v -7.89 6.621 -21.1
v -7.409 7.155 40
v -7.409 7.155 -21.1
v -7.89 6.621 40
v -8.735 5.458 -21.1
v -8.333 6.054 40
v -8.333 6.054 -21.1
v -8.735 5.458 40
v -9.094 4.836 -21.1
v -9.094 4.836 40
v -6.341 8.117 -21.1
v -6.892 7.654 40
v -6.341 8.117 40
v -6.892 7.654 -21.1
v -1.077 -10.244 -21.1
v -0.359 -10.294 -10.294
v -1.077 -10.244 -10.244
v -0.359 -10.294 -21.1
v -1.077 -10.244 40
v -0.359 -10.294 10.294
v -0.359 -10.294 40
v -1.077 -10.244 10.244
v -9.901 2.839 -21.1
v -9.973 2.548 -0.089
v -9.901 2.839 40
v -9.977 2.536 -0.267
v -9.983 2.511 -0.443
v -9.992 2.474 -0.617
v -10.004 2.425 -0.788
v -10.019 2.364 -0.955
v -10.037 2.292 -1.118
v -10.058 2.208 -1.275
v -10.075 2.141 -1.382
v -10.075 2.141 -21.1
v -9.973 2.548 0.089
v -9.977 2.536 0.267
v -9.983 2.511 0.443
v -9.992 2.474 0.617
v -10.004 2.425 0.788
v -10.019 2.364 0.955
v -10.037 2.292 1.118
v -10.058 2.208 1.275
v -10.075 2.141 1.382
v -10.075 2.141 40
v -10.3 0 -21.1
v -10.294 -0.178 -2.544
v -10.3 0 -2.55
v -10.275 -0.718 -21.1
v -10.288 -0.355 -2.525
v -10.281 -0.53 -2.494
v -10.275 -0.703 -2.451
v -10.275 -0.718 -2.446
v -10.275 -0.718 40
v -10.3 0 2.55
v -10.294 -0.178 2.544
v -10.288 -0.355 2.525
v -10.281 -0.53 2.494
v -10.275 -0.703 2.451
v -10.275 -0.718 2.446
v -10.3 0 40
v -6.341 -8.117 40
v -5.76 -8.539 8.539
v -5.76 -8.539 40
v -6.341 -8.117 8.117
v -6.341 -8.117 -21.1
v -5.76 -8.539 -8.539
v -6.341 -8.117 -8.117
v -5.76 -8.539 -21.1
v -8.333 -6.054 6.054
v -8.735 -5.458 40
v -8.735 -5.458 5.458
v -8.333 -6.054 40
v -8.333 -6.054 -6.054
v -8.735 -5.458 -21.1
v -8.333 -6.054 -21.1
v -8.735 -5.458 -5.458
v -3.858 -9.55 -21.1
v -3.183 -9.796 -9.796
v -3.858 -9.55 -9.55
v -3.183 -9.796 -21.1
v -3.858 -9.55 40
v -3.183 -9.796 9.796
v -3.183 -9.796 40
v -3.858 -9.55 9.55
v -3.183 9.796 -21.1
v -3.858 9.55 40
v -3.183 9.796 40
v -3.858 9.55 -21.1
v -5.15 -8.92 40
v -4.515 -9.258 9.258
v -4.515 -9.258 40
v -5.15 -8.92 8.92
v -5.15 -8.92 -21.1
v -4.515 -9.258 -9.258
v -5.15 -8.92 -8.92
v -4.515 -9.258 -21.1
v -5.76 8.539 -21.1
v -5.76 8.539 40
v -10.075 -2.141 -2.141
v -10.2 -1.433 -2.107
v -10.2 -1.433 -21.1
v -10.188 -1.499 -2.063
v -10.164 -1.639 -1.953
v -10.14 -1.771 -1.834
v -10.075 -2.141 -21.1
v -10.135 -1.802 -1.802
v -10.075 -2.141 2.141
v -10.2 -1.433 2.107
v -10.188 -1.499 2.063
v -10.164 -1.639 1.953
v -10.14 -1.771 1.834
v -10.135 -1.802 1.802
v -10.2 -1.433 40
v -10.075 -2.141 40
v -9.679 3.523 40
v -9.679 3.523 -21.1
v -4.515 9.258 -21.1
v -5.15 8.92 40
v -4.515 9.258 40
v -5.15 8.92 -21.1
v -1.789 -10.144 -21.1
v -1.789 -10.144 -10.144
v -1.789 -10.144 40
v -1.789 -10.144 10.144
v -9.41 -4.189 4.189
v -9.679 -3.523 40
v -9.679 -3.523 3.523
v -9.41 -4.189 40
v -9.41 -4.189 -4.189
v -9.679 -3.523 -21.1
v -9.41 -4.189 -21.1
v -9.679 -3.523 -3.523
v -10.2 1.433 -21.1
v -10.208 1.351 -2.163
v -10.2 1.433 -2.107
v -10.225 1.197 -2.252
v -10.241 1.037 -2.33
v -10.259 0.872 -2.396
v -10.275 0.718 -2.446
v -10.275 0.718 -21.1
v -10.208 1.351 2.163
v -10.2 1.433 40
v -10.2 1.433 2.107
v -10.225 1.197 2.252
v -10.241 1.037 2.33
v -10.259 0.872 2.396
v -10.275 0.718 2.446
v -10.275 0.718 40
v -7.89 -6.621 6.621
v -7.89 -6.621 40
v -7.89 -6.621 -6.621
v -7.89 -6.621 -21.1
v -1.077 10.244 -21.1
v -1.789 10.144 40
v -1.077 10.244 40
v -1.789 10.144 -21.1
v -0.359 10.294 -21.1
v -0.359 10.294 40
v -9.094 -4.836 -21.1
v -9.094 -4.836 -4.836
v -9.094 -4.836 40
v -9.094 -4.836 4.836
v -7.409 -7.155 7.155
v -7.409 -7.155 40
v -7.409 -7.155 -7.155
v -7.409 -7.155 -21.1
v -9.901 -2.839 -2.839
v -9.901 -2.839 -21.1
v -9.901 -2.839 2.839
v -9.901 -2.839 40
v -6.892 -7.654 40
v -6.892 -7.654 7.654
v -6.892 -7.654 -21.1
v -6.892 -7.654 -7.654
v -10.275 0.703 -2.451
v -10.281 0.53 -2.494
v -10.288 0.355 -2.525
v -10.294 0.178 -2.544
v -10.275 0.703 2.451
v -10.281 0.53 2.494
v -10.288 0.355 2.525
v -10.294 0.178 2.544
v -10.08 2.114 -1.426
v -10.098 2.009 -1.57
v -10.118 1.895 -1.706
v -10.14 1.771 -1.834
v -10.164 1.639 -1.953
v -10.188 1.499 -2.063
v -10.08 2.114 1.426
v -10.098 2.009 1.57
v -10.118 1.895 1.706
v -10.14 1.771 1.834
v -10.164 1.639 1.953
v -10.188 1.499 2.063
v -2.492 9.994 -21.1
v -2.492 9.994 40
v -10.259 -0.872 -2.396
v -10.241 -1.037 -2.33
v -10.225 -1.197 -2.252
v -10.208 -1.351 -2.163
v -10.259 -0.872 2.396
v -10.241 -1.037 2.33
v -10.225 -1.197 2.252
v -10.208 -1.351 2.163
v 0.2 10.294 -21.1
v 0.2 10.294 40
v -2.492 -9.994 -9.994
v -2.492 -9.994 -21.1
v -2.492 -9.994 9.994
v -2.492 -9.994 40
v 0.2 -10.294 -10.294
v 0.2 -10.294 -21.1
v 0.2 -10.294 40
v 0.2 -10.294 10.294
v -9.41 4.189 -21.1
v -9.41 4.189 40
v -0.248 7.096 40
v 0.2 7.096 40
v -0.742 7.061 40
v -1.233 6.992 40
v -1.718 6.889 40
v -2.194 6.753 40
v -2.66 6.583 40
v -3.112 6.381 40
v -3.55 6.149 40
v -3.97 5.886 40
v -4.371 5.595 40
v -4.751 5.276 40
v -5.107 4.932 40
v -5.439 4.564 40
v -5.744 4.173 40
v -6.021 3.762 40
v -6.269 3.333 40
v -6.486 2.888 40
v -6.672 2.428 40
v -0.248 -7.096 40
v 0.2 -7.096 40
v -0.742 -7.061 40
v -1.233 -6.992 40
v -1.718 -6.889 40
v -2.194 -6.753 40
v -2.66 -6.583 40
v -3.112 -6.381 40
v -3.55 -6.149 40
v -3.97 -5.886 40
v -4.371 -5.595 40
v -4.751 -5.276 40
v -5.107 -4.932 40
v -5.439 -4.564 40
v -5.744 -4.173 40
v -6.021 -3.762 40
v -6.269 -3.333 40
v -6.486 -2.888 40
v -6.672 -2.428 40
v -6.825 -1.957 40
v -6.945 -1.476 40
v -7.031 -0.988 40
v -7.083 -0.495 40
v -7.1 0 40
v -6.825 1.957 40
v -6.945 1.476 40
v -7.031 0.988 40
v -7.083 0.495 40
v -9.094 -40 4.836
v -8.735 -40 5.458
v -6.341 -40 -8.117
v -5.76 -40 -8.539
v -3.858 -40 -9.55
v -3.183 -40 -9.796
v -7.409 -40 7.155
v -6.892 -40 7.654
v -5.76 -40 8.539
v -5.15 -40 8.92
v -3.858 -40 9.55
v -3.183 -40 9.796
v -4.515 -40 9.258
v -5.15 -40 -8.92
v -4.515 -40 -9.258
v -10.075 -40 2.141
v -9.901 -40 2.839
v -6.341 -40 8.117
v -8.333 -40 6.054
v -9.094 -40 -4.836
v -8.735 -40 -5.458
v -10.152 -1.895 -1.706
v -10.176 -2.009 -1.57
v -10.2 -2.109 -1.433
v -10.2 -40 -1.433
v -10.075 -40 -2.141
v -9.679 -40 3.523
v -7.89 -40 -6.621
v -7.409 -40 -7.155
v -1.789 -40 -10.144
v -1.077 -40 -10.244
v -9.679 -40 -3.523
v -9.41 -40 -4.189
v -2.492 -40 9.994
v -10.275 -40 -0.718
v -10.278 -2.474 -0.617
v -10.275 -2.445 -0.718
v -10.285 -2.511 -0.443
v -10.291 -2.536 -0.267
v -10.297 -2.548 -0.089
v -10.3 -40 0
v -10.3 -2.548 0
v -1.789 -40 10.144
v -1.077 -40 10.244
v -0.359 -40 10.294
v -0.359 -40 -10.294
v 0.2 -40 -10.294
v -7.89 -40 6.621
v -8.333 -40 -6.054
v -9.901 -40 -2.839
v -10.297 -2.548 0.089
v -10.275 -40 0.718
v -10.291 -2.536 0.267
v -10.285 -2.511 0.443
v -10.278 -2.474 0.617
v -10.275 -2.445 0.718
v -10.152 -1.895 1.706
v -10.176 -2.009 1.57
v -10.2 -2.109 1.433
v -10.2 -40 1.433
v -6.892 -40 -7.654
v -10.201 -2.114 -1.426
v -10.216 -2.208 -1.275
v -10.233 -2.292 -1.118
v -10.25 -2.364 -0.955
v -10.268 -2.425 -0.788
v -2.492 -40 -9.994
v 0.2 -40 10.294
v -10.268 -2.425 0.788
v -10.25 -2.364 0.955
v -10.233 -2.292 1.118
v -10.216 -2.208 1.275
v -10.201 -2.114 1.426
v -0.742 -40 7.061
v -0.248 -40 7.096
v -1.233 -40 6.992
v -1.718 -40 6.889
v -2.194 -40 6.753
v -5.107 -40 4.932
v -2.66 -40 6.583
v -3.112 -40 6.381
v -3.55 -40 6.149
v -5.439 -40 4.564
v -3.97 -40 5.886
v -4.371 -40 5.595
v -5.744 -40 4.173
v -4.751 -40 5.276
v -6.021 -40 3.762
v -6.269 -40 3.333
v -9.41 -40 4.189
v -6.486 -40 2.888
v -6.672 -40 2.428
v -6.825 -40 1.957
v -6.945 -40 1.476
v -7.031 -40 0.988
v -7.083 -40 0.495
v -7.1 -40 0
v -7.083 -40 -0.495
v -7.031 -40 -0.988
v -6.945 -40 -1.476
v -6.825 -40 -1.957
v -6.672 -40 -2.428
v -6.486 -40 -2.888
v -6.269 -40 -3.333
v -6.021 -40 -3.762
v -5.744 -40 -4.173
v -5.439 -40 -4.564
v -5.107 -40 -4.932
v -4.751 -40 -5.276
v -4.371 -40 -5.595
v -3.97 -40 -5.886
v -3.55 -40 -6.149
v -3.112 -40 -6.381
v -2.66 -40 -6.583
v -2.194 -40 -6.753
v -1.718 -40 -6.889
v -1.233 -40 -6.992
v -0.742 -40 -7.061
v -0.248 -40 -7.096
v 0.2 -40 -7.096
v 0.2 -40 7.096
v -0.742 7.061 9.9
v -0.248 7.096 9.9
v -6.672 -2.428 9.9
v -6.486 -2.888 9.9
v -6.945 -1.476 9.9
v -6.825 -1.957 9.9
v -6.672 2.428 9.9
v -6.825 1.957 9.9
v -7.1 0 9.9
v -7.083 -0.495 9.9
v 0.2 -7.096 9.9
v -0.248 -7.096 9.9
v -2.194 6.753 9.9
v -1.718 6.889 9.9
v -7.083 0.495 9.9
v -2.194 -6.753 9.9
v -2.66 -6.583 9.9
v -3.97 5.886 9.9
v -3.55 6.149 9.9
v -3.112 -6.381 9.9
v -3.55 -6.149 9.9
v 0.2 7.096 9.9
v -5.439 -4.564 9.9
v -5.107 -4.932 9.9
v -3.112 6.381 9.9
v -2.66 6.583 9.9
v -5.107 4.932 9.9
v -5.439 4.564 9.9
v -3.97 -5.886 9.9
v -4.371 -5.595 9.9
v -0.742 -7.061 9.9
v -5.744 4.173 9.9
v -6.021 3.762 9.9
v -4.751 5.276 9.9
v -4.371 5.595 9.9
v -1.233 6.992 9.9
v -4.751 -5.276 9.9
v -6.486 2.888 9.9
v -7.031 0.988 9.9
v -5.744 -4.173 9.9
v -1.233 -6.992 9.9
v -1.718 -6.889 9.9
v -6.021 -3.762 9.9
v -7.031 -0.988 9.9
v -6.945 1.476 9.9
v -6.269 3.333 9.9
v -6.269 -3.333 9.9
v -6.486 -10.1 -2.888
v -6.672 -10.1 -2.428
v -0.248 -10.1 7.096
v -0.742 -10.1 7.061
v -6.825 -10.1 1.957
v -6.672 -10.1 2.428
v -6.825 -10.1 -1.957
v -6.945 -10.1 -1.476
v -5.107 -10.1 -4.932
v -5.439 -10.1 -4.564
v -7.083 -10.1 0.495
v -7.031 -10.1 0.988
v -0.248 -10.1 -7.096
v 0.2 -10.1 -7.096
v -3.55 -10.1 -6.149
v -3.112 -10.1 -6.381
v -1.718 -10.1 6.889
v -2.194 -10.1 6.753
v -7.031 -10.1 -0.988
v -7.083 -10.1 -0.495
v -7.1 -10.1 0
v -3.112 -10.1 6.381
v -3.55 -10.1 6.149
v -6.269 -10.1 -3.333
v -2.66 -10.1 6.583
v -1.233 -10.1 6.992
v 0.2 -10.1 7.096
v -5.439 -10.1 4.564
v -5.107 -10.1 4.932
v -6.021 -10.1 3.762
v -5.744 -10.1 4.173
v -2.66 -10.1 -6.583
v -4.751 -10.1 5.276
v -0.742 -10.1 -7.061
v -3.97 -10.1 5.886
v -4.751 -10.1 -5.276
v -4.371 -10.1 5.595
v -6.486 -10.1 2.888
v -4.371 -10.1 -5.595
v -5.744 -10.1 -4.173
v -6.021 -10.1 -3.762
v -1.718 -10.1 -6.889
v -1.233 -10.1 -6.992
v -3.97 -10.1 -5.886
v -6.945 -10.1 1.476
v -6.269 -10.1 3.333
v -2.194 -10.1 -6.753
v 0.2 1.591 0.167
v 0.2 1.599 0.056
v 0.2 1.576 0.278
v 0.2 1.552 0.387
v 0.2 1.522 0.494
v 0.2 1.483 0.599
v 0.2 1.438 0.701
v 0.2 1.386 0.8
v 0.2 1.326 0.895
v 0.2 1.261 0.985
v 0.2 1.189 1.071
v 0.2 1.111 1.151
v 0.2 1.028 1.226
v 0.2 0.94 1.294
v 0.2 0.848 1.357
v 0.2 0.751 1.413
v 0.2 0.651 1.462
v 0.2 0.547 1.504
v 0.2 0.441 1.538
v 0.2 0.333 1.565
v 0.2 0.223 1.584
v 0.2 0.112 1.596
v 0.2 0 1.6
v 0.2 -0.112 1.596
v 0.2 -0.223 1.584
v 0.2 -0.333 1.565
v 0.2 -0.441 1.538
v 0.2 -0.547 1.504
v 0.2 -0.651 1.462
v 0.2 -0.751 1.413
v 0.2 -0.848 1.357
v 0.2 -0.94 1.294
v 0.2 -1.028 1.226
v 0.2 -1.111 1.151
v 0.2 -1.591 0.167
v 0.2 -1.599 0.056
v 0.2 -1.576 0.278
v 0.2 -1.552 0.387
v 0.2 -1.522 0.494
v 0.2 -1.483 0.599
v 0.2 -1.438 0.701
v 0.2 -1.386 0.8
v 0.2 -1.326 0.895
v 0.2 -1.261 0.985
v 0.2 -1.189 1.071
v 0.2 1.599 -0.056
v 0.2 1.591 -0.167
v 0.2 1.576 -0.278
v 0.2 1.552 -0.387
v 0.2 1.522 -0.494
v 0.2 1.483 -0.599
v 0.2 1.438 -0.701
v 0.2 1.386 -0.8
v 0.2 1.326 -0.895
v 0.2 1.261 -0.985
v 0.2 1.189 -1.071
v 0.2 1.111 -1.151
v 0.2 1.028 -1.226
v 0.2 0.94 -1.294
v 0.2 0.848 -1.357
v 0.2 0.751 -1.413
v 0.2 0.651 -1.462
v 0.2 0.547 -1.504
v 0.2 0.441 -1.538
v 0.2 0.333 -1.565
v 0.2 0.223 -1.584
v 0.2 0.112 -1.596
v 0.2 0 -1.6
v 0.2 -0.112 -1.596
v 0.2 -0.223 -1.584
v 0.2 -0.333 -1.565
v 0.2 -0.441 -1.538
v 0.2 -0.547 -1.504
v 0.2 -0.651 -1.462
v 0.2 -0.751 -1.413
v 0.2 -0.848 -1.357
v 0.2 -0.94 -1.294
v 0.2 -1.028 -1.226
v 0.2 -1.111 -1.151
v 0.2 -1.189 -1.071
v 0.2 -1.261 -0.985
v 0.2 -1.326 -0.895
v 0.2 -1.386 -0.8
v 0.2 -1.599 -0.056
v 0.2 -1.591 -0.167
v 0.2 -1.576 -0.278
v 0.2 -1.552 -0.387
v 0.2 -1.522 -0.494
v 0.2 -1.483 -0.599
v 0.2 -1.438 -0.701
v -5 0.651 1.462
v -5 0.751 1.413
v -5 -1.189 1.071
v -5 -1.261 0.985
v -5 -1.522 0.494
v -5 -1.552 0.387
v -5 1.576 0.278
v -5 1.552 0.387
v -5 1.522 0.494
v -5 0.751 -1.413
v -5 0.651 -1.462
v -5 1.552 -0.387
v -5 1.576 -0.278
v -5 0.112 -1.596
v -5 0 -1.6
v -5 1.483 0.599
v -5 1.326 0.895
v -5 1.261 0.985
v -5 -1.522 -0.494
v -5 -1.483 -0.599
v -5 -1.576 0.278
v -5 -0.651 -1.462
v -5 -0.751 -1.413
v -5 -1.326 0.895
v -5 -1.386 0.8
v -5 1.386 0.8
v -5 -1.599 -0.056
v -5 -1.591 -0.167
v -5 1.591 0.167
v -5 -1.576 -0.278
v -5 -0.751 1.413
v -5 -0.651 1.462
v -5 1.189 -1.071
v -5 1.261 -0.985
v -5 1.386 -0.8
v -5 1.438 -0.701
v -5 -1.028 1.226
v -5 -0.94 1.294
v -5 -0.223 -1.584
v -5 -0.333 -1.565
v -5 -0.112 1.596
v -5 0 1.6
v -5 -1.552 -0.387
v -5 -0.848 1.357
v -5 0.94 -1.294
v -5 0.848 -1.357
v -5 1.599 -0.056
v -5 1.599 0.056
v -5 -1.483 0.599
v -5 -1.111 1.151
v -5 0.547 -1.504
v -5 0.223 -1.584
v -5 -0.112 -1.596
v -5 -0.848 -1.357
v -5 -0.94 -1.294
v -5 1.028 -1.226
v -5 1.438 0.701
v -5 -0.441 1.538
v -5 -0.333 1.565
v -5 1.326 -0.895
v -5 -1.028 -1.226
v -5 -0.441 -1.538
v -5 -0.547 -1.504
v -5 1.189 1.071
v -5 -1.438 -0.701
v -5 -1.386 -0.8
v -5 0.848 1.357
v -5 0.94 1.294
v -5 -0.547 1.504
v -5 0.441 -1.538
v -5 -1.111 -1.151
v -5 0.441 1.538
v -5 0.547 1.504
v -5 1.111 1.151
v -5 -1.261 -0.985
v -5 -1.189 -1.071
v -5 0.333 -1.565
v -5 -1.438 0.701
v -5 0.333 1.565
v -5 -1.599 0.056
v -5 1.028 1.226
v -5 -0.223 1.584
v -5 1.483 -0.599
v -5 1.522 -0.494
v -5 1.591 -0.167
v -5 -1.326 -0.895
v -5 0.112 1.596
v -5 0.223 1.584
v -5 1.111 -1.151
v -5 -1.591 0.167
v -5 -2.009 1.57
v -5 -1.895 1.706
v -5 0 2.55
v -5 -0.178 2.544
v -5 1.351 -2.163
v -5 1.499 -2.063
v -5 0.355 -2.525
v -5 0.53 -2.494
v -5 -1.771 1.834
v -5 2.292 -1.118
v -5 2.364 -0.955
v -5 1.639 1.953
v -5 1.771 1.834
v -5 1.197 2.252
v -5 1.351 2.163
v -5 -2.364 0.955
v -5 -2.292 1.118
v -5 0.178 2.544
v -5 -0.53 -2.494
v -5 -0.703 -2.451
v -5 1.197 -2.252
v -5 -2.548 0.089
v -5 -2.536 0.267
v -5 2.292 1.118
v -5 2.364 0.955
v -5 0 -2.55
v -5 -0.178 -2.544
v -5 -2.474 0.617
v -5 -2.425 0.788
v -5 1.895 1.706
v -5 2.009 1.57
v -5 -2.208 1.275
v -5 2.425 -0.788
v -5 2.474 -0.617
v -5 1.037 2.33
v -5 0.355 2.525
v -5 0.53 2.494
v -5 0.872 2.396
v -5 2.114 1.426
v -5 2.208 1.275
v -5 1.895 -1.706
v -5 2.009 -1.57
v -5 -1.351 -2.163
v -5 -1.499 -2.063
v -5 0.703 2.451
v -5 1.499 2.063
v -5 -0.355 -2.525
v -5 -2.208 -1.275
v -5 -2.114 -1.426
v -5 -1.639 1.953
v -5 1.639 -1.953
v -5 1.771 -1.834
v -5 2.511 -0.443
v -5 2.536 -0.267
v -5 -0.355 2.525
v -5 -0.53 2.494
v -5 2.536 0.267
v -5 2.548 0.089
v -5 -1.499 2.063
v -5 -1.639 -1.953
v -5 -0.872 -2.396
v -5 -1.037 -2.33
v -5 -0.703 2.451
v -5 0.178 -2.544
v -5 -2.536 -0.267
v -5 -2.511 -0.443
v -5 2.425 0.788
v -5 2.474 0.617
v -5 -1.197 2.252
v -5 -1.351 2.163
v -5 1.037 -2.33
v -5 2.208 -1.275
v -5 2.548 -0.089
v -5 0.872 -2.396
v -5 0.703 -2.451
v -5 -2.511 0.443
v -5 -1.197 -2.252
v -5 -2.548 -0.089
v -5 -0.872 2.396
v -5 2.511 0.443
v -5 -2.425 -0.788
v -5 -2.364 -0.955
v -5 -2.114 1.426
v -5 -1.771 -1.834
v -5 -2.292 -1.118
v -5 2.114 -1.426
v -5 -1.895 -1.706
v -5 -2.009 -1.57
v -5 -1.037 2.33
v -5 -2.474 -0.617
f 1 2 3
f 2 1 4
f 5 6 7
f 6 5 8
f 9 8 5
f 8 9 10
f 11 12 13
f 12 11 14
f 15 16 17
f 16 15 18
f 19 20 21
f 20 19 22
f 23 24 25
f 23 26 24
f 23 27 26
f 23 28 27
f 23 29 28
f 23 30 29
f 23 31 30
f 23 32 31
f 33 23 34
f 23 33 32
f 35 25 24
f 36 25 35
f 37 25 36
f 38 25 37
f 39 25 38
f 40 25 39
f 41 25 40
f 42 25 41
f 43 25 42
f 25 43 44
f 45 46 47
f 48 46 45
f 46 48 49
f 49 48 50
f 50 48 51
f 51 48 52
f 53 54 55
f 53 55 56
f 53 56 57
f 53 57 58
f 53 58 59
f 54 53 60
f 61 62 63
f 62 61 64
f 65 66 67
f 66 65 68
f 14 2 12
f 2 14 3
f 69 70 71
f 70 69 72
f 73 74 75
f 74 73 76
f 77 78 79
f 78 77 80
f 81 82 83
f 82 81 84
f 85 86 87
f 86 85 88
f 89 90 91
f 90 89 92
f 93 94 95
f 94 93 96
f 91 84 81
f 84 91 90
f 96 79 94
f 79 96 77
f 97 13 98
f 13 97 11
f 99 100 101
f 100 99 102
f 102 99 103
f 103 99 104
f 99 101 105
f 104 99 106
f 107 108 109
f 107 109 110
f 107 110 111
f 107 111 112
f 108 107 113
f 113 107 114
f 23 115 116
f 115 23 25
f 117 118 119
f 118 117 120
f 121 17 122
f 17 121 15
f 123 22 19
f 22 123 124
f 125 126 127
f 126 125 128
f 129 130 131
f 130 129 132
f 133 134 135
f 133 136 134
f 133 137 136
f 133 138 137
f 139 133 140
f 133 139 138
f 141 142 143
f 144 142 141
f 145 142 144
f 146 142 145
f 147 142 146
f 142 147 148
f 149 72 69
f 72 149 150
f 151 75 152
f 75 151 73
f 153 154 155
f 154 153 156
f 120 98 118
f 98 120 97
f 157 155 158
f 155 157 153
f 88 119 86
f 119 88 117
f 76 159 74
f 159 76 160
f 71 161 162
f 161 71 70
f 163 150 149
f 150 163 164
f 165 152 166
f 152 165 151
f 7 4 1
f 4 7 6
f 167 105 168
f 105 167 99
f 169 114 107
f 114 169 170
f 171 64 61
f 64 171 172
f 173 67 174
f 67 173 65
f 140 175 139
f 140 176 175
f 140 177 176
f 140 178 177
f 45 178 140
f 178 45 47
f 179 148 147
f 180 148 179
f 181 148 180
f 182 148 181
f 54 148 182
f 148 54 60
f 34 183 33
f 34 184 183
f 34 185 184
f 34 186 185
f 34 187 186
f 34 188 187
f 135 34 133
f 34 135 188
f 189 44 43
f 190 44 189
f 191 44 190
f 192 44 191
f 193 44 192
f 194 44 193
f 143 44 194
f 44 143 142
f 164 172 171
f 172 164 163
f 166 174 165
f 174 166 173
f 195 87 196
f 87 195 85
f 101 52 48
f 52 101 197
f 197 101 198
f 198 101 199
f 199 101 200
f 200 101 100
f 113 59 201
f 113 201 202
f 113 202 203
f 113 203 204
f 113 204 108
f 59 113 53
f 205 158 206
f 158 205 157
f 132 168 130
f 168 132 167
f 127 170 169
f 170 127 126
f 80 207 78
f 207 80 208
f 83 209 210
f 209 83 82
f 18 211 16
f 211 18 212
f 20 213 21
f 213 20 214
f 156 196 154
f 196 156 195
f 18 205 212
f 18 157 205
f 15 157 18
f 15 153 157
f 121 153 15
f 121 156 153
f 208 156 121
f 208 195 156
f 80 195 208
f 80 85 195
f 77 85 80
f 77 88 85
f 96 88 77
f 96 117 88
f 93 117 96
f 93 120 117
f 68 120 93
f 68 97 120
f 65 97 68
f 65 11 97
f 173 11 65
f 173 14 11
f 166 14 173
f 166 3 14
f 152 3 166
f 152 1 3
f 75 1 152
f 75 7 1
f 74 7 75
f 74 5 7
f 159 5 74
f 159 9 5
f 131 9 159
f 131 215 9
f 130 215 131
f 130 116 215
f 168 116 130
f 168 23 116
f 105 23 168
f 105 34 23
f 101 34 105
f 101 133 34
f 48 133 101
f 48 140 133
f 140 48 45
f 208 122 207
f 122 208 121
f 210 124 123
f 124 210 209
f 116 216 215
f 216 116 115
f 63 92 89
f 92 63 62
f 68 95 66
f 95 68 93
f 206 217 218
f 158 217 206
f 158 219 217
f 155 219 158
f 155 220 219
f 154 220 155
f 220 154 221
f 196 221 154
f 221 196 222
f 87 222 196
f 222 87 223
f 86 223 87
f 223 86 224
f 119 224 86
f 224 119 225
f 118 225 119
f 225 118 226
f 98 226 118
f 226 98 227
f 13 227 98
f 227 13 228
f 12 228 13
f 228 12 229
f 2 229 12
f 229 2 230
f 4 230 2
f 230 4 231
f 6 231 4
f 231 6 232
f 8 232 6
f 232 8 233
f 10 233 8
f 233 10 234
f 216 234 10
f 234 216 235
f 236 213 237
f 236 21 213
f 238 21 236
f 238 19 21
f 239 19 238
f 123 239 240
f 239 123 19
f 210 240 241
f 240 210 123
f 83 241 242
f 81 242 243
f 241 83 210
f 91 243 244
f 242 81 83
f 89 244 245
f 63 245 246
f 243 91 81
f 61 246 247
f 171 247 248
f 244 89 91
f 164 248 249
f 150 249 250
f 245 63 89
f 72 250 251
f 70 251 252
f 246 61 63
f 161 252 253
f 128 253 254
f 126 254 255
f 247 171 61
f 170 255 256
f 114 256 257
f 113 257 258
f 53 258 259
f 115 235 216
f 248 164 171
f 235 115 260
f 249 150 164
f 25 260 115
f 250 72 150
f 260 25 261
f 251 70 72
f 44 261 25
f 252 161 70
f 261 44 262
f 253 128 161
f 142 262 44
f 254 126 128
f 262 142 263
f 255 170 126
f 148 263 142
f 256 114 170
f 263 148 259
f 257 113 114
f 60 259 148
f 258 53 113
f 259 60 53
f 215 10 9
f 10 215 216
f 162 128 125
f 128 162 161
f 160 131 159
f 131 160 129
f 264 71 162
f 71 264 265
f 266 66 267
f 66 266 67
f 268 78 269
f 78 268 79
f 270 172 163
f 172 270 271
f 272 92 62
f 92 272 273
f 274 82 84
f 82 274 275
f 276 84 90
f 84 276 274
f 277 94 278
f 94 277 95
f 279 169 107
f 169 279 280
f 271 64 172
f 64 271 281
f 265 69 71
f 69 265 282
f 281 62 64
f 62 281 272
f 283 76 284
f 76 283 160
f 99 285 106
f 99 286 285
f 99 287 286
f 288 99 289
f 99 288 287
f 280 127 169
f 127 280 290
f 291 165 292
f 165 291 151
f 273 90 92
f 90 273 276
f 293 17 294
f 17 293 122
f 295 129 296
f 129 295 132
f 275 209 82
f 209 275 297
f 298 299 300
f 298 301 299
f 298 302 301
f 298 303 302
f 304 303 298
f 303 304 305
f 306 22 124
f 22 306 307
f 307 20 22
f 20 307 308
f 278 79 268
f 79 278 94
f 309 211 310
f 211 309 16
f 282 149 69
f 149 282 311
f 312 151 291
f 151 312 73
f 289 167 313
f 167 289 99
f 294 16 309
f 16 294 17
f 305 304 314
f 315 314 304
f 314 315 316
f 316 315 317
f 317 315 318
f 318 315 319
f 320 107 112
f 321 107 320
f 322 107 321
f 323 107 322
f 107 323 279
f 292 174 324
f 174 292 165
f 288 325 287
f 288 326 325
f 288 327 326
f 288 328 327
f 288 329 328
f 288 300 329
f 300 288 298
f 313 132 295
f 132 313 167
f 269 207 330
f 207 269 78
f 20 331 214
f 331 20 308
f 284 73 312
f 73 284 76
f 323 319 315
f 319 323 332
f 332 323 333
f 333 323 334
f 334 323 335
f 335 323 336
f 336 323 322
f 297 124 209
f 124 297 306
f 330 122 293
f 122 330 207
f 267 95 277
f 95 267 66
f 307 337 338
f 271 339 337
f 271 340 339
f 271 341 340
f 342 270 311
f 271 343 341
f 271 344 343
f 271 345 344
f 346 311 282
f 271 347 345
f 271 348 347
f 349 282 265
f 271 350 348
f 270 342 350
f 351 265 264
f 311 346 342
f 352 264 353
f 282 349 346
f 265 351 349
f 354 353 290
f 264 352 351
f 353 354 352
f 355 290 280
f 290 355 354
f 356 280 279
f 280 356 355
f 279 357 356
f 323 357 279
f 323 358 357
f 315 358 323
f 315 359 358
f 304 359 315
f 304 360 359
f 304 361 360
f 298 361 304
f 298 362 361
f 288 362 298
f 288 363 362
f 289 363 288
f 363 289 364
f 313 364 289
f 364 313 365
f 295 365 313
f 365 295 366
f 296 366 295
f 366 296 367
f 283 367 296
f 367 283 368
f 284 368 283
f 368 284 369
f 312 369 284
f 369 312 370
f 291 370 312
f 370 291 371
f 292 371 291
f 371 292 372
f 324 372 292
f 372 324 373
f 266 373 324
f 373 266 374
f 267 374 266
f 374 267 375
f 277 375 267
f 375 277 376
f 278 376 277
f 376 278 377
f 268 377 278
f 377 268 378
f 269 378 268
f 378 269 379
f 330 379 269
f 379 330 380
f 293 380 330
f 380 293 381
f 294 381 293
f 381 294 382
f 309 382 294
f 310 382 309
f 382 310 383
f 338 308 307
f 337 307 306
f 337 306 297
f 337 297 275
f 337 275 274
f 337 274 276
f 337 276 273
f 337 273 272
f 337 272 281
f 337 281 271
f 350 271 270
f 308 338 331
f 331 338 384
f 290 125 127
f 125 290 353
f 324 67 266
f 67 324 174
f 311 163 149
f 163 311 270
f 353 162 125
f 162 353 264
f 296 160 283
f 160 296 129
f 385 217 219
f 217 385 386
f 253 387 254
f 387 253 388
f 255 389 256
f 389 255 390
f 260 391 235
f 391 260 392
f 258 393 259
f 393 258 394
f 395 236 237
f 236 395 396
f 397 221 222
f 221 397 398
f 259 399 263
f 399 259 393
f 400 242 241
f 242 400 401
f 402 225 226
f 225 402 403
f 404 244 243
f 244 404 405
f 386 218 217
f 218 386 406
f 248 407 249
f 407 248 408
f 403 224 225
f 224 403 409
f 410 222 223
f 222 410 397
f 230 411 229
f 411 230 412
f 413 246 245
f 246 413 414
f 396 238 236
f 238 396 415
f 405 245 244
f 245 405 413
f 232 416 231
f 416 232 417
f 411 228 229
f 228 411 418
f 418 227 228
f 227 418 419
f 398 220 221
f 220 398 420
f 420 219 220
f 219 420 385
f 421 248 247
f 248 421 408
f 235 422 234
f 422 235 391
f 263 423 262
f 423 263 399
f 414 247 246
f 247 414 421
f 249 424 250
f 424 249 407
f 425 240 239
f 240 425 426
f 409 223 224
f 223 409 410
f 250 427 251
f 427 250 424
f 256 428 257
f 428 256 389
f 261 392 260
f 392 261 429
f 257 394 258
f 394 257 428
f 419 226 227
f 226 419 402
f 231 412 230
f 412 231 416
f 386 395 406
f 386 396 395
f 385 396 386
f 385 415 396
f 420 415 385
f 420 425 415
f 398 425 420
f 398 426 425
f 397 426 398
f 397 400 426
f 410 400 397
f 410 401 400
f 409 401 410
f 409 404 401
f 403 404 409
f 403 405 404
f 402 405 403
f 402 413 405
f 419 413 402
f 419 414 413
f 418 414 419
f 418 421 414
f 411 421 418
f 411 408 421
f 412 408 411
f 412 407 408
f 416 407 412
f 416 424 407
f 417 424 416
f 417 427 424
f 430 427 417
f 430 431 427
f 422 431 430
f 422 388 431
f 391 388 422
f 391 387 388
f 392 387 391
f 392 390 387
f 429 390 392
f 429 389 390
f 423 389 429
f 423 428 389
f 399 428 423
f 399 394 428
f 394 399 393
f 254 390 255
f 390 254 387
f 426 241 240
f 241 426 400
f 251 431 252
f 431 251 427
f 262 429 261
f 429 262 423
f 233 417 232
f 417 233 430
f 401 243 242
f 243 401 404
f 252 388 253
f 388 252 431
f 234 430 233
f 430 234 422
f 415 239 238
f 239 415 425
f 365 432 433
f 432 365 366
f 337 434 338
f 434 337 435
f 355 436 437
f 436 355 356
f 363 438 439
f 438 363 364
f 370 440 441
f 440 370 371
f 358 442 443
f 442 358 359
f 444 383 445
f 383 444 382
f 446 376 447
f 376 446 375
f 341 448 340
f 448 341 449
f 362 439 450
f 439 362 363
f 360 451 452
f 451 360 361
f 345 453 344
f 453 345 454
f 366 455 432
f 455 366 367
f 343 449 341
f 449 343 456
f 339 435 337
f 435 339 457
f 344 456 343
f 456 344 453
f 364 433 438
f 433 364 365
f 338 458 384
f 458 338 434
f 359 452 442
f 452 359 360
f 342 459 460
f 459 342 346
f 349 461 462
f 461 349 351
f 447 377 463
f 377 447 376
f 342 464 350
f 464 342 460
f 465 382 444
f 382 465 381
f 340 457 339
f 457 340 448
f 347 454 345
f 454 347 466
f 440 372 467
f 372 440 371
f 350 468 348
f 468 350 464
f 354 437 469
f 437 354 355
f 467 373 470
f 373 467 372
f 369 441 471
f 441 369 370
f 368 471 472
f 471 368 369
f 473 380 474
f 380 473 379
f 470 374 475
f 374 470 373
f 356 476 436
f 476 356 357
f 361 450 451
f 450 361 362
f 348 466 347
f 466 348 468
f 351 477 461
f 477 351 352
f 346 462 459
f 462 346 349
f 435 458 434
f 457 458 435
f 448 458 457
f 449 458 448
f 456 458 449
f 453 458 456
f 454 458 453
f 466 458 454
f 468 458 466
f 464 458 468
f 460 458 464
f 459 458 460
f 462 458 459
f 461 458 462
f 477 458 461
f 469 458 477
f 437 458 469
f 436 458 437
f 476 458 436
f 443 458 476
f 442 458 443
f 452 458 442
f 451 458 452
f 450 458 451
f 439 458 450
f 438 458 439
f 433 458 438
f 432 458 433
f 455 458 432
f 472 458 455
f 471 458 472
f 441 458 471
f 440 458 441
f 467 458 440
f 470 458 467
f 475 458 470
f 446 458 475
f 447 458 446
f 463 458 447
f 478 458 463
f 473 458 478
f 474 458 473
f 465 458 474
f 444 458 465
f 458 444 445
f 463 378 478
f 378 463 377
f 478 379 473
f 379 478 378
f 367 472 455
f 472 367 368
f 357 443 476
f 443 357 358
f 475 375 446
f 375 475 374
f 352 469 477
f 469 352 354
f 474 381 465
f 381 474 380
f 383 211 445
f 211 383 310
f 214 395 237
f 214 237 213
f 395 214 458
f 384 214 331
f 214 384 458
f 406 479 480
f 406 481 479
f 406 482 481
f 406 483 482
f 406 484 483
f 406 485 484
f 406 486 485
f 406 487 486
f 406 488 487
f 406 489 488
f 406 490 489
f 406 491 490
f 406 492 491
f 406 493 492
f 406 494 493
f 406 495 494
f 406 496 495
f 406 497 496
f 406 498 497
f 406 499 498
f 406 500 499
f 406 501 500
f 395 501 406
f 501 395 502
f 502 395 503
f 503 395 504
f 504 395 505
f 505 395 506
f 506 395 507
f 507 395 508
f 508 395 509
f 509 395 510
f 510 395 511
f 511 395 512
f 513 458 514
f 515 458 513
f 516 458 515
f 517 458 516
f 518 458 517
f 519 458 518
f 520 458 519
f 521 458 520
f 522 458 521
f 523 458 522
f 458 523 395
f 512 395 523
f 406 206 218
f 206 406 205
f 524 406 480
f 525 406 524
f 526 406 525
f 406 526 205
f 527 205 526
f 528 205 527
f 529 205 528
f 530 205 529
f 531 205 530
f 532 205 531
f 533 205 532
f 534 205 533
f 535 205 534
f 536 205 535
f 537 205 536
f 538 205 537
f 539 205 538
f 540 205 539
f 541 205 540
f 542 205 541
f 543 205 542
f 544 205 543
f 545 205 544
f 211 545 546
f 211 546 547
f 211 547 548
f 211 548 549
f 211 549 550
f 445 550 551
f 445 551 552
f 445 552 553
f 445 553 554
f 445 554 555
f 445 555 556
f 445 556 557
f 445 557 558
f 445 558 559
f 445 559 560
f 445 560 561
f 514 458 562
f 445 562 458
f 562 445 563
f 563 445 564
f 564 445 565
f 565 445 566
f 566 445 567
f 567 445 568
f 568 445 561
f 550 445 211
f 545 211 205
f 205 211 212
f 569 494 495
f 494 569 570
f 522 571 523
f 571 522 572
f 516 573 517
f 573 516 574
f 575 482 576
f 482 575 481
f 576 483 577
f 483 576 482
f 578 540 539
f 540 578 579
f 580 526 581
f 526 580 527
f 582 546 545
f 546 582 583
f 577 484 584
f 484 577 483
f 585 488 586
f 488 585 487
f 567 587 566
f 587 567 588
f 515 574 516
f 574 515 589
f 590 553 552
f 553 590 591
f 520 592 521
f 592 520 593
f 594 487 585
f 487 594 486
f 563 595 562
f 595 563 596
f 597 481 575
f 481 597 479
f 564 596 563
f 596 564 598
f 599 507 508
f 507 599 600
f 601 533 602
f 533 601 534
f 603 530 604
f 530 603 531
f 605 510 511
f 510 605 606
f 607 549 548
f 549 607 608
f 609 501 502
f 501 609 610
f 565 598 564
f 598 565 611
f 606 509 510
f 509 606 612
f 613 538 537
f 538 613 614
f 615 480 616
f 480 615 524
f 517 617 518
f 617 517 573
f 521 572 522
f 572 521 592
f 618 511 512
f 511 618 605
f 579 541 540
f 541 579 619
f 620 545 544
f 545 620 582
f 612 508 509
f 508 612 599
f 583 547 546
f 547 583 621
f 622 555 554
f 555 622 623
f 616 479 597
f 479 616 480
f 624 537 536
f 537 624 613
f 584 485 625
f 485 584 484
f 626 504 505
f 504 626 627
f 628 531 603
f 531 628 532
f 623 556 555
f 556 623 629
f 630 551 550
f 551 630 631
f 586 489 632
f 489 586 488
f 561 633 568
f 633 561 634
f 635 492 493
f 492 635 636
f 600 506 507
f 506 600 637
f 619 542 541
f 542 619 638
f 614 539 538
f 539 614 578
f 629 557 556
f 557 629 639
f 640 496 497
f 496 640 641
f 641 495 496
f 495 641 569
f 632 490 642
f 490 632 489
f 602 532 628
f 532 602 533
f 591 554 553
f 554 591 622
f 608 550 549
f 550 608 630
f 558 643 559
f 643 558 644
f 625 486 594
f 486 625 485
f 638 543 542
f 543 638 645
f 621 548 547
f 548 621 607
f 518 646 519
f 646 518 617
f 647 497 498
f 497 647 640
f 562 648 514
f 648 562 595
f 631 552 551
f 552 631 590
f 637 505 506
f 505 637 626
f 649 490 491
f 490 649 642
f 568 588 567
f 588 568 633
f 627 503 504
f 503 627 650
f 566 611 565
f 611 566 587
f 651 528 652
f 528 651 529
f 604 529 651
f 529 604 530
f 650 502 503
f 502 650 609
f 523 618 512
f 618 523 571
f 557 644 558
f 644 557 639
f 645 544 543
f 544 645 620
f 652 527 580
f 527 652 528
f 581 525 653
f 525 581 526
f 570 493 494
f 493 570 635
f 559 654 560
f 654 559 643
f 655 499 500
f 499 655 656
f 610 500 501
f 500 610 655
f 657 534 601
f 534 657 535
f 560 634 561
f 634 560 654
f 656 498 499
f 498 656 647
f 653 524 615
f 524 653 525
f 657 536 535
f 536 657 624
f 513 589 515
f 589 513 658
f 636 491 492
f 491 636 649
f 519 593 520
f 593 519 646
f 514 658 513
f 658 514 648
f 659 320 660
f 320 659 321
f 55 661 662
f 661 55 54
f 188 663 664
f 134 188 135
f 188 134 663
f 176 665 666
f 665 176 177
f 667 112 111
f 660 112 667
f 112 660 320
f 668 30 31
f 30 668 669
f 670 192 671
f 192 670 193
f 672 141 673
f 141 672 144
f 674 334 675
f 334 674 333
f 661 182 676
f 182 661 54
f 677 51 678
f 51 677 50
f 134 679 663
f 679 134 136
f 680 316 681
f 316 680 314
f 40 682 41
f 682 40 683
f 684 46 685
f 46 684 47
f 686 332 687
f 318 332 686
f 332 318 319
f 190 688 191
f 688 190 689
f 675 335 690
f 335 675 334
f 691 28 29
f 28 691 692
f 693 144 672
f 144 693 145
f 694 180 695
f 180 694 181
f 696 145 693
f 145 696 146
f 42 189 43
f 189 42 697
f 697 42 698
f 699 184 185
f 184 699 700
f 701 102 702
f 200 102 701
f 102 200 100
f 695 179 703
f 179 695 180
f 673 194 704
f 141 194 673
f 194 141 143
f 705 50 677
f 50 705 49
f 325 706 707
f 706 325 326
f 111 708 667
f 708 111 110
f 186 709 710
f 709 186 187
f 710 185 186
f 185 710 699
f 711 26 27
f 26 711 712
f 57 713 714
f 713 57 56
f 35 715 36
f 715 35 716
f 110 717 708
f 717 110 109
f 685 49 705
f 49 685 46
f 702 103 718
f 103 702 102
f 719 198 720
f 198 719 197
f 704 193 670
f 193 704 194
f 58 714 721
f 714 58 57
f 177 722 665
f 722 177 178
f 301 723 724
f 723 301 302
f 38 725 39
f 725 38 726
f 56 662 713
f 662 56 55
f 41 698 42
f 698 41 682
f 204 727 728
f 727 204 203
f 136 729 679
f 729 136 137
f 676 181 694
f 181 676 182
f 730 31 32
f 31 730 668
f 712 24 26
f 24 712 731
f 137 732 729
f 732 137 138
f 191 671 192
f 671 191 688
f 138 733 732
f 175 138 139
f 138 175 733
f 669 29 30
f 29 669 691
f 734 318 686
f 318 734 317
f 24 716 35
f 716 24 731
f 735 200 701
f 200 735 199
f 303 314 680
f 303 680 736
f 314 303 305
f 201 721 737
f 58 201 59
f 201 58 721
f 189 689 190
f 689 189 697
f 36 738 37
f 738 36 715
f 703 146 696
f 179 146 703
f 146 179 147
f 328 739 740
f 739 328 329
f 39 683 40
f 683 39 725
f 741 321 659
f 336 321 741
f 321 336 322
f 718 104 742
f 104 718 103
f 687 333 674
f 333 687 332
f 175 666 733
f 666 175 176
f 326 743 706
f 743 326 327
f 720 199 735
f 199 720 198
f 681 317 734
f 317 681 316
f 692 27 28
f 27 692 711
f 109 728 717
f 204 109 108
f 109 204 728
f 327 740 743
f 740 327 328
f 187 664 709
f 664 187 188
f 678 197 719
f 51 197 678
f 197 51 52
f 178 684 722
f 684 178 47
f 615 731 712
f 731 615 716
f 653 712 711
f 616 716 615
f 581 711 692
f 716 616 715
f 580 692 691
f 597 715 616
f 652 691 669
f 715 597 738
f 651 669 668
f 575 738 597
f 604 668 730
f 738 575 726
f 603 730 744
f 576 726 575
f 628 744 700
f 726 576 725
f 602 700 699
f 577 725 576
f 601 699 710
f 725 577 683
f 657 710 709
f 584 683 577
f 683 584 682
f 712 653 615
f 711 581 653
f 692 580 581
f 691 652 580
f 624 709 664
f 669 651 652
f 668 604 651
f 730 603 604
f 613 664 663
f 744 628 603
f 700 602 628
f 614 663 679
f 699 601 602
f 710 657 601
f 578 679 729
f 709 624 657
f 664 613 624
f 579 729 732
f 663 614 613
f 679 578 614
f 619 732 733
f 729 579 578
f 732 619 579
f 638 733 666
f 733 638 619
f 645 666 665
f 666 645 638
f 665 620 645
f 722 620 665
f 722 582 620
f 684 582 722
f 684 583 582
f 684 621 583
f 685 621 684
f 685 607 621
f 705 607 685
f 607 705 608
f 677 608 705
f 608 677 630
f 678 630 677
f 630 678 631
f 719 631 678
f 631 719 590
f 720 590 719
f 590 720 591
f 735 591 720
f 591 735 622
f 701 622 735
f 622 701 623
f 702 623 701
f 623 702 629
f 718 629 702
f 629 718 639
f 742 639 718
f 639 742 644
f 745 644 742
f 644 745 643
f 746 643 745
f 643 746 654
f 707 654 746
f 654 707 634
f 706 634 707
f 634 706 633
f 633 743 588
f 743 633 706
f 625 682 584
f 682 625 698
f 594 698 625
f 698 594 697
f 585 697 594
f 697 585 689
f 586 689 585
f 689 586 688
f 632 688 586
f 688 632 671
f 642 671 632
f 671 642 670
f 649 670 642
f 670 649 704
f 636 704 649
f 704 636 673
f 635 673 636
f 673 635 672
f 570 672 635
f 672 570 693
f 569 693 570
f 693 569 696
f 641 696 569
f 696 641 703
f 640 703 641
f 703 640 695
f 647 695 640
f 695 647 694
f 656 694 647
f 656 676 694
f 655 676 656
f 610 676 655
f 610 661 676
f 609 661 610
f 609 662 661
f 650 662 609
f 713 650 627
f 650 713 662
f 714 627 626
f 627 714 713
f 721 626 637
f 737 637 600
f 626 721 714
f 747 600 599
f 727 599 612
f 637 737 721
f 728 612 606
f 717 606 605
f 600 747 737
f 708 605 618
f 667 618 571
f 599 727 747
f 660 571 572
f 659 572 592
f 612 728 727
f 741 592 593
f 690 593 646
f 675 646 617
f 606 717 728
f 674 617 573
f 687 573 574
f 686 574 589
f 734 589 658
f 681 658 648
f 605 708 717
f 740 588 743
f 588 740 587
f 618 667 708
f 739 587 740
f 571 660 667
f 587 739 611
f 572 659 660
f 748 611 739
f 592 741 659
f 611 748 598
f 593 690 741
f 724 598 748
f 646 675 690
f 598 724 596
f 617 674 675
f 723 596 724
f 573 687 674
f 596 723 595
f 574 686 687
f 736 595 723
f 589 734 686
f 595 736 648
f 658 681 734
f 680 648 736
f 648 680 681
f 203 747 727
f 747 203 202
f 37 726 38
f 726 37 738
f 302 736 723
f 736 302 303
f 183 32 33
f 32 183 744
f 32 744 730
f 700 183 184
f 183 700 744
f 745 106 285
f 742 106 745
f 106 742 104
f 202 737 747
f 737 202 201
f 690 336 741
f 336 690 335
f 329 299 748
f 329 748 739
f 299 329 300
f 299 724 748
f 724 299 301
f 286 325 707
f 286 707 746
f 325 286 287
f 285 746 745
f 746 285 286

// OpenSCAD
$fa=4; // default minimum facet angle is now 0.5
$fs=0.05; // default minimum facet size is now 0.05 mm

tolerance = .1;

clampGap = .2;
pipeRad = 7 + tolerance;
insertDepth = 30;
totalLen = 40;
groundHeight = 14;
wallThickness = 3.2;

screwHeadExtraGap = .3;
screwRad = 1.5 + tolerance;
screwHeadRad = 2.25 + screwHeadExtraGap;
nutRad = 3.1 + tolerance;

difference() {
  union() {
    translate([0, 0, -groundHeight - pipeRad]) cylinder(h = totalLen + groundHeight + pipeRad, r = pipeRad + wallThickness);
    rotate([90, 0, 0]) cylinder(h = totalLen, r = pipeRad + wallThickness);
  }

  union() {
    translate([0, 0, totalLen - insertDepth -.1]) cylinder(h = insertDepth + .2, r = pipeRad);
    translate([0, insertDepth - totalLen -.1, 0]) rotate([90, 0, 0]) cylinder(h = insertDepth + .1, r = pipeRad);
    translate([clampGap, -50, -50]) cube([20, 100, 100]);
    rotate([0, 90, 0]) cylinder(h = 50, r = screwRad, center=true);
    translate([-5, 0, 0]) rotate([0, -90, 0]) cylinder(h = 50, r = screwHeadRad);
  }
}

module hexagon(r = 1) {
  polygon([
    [-1 * r, 0],
    [-.5 * r, r * sqrt(3) / 2],
    [.5 * r, r * sqrt(3) / 2],
    [1 * r, 0],
    [.5 * r, r * sqrt(3) / -2],
    [-.5 * r, r * sqrt(3) / -2],
  ]);
}
